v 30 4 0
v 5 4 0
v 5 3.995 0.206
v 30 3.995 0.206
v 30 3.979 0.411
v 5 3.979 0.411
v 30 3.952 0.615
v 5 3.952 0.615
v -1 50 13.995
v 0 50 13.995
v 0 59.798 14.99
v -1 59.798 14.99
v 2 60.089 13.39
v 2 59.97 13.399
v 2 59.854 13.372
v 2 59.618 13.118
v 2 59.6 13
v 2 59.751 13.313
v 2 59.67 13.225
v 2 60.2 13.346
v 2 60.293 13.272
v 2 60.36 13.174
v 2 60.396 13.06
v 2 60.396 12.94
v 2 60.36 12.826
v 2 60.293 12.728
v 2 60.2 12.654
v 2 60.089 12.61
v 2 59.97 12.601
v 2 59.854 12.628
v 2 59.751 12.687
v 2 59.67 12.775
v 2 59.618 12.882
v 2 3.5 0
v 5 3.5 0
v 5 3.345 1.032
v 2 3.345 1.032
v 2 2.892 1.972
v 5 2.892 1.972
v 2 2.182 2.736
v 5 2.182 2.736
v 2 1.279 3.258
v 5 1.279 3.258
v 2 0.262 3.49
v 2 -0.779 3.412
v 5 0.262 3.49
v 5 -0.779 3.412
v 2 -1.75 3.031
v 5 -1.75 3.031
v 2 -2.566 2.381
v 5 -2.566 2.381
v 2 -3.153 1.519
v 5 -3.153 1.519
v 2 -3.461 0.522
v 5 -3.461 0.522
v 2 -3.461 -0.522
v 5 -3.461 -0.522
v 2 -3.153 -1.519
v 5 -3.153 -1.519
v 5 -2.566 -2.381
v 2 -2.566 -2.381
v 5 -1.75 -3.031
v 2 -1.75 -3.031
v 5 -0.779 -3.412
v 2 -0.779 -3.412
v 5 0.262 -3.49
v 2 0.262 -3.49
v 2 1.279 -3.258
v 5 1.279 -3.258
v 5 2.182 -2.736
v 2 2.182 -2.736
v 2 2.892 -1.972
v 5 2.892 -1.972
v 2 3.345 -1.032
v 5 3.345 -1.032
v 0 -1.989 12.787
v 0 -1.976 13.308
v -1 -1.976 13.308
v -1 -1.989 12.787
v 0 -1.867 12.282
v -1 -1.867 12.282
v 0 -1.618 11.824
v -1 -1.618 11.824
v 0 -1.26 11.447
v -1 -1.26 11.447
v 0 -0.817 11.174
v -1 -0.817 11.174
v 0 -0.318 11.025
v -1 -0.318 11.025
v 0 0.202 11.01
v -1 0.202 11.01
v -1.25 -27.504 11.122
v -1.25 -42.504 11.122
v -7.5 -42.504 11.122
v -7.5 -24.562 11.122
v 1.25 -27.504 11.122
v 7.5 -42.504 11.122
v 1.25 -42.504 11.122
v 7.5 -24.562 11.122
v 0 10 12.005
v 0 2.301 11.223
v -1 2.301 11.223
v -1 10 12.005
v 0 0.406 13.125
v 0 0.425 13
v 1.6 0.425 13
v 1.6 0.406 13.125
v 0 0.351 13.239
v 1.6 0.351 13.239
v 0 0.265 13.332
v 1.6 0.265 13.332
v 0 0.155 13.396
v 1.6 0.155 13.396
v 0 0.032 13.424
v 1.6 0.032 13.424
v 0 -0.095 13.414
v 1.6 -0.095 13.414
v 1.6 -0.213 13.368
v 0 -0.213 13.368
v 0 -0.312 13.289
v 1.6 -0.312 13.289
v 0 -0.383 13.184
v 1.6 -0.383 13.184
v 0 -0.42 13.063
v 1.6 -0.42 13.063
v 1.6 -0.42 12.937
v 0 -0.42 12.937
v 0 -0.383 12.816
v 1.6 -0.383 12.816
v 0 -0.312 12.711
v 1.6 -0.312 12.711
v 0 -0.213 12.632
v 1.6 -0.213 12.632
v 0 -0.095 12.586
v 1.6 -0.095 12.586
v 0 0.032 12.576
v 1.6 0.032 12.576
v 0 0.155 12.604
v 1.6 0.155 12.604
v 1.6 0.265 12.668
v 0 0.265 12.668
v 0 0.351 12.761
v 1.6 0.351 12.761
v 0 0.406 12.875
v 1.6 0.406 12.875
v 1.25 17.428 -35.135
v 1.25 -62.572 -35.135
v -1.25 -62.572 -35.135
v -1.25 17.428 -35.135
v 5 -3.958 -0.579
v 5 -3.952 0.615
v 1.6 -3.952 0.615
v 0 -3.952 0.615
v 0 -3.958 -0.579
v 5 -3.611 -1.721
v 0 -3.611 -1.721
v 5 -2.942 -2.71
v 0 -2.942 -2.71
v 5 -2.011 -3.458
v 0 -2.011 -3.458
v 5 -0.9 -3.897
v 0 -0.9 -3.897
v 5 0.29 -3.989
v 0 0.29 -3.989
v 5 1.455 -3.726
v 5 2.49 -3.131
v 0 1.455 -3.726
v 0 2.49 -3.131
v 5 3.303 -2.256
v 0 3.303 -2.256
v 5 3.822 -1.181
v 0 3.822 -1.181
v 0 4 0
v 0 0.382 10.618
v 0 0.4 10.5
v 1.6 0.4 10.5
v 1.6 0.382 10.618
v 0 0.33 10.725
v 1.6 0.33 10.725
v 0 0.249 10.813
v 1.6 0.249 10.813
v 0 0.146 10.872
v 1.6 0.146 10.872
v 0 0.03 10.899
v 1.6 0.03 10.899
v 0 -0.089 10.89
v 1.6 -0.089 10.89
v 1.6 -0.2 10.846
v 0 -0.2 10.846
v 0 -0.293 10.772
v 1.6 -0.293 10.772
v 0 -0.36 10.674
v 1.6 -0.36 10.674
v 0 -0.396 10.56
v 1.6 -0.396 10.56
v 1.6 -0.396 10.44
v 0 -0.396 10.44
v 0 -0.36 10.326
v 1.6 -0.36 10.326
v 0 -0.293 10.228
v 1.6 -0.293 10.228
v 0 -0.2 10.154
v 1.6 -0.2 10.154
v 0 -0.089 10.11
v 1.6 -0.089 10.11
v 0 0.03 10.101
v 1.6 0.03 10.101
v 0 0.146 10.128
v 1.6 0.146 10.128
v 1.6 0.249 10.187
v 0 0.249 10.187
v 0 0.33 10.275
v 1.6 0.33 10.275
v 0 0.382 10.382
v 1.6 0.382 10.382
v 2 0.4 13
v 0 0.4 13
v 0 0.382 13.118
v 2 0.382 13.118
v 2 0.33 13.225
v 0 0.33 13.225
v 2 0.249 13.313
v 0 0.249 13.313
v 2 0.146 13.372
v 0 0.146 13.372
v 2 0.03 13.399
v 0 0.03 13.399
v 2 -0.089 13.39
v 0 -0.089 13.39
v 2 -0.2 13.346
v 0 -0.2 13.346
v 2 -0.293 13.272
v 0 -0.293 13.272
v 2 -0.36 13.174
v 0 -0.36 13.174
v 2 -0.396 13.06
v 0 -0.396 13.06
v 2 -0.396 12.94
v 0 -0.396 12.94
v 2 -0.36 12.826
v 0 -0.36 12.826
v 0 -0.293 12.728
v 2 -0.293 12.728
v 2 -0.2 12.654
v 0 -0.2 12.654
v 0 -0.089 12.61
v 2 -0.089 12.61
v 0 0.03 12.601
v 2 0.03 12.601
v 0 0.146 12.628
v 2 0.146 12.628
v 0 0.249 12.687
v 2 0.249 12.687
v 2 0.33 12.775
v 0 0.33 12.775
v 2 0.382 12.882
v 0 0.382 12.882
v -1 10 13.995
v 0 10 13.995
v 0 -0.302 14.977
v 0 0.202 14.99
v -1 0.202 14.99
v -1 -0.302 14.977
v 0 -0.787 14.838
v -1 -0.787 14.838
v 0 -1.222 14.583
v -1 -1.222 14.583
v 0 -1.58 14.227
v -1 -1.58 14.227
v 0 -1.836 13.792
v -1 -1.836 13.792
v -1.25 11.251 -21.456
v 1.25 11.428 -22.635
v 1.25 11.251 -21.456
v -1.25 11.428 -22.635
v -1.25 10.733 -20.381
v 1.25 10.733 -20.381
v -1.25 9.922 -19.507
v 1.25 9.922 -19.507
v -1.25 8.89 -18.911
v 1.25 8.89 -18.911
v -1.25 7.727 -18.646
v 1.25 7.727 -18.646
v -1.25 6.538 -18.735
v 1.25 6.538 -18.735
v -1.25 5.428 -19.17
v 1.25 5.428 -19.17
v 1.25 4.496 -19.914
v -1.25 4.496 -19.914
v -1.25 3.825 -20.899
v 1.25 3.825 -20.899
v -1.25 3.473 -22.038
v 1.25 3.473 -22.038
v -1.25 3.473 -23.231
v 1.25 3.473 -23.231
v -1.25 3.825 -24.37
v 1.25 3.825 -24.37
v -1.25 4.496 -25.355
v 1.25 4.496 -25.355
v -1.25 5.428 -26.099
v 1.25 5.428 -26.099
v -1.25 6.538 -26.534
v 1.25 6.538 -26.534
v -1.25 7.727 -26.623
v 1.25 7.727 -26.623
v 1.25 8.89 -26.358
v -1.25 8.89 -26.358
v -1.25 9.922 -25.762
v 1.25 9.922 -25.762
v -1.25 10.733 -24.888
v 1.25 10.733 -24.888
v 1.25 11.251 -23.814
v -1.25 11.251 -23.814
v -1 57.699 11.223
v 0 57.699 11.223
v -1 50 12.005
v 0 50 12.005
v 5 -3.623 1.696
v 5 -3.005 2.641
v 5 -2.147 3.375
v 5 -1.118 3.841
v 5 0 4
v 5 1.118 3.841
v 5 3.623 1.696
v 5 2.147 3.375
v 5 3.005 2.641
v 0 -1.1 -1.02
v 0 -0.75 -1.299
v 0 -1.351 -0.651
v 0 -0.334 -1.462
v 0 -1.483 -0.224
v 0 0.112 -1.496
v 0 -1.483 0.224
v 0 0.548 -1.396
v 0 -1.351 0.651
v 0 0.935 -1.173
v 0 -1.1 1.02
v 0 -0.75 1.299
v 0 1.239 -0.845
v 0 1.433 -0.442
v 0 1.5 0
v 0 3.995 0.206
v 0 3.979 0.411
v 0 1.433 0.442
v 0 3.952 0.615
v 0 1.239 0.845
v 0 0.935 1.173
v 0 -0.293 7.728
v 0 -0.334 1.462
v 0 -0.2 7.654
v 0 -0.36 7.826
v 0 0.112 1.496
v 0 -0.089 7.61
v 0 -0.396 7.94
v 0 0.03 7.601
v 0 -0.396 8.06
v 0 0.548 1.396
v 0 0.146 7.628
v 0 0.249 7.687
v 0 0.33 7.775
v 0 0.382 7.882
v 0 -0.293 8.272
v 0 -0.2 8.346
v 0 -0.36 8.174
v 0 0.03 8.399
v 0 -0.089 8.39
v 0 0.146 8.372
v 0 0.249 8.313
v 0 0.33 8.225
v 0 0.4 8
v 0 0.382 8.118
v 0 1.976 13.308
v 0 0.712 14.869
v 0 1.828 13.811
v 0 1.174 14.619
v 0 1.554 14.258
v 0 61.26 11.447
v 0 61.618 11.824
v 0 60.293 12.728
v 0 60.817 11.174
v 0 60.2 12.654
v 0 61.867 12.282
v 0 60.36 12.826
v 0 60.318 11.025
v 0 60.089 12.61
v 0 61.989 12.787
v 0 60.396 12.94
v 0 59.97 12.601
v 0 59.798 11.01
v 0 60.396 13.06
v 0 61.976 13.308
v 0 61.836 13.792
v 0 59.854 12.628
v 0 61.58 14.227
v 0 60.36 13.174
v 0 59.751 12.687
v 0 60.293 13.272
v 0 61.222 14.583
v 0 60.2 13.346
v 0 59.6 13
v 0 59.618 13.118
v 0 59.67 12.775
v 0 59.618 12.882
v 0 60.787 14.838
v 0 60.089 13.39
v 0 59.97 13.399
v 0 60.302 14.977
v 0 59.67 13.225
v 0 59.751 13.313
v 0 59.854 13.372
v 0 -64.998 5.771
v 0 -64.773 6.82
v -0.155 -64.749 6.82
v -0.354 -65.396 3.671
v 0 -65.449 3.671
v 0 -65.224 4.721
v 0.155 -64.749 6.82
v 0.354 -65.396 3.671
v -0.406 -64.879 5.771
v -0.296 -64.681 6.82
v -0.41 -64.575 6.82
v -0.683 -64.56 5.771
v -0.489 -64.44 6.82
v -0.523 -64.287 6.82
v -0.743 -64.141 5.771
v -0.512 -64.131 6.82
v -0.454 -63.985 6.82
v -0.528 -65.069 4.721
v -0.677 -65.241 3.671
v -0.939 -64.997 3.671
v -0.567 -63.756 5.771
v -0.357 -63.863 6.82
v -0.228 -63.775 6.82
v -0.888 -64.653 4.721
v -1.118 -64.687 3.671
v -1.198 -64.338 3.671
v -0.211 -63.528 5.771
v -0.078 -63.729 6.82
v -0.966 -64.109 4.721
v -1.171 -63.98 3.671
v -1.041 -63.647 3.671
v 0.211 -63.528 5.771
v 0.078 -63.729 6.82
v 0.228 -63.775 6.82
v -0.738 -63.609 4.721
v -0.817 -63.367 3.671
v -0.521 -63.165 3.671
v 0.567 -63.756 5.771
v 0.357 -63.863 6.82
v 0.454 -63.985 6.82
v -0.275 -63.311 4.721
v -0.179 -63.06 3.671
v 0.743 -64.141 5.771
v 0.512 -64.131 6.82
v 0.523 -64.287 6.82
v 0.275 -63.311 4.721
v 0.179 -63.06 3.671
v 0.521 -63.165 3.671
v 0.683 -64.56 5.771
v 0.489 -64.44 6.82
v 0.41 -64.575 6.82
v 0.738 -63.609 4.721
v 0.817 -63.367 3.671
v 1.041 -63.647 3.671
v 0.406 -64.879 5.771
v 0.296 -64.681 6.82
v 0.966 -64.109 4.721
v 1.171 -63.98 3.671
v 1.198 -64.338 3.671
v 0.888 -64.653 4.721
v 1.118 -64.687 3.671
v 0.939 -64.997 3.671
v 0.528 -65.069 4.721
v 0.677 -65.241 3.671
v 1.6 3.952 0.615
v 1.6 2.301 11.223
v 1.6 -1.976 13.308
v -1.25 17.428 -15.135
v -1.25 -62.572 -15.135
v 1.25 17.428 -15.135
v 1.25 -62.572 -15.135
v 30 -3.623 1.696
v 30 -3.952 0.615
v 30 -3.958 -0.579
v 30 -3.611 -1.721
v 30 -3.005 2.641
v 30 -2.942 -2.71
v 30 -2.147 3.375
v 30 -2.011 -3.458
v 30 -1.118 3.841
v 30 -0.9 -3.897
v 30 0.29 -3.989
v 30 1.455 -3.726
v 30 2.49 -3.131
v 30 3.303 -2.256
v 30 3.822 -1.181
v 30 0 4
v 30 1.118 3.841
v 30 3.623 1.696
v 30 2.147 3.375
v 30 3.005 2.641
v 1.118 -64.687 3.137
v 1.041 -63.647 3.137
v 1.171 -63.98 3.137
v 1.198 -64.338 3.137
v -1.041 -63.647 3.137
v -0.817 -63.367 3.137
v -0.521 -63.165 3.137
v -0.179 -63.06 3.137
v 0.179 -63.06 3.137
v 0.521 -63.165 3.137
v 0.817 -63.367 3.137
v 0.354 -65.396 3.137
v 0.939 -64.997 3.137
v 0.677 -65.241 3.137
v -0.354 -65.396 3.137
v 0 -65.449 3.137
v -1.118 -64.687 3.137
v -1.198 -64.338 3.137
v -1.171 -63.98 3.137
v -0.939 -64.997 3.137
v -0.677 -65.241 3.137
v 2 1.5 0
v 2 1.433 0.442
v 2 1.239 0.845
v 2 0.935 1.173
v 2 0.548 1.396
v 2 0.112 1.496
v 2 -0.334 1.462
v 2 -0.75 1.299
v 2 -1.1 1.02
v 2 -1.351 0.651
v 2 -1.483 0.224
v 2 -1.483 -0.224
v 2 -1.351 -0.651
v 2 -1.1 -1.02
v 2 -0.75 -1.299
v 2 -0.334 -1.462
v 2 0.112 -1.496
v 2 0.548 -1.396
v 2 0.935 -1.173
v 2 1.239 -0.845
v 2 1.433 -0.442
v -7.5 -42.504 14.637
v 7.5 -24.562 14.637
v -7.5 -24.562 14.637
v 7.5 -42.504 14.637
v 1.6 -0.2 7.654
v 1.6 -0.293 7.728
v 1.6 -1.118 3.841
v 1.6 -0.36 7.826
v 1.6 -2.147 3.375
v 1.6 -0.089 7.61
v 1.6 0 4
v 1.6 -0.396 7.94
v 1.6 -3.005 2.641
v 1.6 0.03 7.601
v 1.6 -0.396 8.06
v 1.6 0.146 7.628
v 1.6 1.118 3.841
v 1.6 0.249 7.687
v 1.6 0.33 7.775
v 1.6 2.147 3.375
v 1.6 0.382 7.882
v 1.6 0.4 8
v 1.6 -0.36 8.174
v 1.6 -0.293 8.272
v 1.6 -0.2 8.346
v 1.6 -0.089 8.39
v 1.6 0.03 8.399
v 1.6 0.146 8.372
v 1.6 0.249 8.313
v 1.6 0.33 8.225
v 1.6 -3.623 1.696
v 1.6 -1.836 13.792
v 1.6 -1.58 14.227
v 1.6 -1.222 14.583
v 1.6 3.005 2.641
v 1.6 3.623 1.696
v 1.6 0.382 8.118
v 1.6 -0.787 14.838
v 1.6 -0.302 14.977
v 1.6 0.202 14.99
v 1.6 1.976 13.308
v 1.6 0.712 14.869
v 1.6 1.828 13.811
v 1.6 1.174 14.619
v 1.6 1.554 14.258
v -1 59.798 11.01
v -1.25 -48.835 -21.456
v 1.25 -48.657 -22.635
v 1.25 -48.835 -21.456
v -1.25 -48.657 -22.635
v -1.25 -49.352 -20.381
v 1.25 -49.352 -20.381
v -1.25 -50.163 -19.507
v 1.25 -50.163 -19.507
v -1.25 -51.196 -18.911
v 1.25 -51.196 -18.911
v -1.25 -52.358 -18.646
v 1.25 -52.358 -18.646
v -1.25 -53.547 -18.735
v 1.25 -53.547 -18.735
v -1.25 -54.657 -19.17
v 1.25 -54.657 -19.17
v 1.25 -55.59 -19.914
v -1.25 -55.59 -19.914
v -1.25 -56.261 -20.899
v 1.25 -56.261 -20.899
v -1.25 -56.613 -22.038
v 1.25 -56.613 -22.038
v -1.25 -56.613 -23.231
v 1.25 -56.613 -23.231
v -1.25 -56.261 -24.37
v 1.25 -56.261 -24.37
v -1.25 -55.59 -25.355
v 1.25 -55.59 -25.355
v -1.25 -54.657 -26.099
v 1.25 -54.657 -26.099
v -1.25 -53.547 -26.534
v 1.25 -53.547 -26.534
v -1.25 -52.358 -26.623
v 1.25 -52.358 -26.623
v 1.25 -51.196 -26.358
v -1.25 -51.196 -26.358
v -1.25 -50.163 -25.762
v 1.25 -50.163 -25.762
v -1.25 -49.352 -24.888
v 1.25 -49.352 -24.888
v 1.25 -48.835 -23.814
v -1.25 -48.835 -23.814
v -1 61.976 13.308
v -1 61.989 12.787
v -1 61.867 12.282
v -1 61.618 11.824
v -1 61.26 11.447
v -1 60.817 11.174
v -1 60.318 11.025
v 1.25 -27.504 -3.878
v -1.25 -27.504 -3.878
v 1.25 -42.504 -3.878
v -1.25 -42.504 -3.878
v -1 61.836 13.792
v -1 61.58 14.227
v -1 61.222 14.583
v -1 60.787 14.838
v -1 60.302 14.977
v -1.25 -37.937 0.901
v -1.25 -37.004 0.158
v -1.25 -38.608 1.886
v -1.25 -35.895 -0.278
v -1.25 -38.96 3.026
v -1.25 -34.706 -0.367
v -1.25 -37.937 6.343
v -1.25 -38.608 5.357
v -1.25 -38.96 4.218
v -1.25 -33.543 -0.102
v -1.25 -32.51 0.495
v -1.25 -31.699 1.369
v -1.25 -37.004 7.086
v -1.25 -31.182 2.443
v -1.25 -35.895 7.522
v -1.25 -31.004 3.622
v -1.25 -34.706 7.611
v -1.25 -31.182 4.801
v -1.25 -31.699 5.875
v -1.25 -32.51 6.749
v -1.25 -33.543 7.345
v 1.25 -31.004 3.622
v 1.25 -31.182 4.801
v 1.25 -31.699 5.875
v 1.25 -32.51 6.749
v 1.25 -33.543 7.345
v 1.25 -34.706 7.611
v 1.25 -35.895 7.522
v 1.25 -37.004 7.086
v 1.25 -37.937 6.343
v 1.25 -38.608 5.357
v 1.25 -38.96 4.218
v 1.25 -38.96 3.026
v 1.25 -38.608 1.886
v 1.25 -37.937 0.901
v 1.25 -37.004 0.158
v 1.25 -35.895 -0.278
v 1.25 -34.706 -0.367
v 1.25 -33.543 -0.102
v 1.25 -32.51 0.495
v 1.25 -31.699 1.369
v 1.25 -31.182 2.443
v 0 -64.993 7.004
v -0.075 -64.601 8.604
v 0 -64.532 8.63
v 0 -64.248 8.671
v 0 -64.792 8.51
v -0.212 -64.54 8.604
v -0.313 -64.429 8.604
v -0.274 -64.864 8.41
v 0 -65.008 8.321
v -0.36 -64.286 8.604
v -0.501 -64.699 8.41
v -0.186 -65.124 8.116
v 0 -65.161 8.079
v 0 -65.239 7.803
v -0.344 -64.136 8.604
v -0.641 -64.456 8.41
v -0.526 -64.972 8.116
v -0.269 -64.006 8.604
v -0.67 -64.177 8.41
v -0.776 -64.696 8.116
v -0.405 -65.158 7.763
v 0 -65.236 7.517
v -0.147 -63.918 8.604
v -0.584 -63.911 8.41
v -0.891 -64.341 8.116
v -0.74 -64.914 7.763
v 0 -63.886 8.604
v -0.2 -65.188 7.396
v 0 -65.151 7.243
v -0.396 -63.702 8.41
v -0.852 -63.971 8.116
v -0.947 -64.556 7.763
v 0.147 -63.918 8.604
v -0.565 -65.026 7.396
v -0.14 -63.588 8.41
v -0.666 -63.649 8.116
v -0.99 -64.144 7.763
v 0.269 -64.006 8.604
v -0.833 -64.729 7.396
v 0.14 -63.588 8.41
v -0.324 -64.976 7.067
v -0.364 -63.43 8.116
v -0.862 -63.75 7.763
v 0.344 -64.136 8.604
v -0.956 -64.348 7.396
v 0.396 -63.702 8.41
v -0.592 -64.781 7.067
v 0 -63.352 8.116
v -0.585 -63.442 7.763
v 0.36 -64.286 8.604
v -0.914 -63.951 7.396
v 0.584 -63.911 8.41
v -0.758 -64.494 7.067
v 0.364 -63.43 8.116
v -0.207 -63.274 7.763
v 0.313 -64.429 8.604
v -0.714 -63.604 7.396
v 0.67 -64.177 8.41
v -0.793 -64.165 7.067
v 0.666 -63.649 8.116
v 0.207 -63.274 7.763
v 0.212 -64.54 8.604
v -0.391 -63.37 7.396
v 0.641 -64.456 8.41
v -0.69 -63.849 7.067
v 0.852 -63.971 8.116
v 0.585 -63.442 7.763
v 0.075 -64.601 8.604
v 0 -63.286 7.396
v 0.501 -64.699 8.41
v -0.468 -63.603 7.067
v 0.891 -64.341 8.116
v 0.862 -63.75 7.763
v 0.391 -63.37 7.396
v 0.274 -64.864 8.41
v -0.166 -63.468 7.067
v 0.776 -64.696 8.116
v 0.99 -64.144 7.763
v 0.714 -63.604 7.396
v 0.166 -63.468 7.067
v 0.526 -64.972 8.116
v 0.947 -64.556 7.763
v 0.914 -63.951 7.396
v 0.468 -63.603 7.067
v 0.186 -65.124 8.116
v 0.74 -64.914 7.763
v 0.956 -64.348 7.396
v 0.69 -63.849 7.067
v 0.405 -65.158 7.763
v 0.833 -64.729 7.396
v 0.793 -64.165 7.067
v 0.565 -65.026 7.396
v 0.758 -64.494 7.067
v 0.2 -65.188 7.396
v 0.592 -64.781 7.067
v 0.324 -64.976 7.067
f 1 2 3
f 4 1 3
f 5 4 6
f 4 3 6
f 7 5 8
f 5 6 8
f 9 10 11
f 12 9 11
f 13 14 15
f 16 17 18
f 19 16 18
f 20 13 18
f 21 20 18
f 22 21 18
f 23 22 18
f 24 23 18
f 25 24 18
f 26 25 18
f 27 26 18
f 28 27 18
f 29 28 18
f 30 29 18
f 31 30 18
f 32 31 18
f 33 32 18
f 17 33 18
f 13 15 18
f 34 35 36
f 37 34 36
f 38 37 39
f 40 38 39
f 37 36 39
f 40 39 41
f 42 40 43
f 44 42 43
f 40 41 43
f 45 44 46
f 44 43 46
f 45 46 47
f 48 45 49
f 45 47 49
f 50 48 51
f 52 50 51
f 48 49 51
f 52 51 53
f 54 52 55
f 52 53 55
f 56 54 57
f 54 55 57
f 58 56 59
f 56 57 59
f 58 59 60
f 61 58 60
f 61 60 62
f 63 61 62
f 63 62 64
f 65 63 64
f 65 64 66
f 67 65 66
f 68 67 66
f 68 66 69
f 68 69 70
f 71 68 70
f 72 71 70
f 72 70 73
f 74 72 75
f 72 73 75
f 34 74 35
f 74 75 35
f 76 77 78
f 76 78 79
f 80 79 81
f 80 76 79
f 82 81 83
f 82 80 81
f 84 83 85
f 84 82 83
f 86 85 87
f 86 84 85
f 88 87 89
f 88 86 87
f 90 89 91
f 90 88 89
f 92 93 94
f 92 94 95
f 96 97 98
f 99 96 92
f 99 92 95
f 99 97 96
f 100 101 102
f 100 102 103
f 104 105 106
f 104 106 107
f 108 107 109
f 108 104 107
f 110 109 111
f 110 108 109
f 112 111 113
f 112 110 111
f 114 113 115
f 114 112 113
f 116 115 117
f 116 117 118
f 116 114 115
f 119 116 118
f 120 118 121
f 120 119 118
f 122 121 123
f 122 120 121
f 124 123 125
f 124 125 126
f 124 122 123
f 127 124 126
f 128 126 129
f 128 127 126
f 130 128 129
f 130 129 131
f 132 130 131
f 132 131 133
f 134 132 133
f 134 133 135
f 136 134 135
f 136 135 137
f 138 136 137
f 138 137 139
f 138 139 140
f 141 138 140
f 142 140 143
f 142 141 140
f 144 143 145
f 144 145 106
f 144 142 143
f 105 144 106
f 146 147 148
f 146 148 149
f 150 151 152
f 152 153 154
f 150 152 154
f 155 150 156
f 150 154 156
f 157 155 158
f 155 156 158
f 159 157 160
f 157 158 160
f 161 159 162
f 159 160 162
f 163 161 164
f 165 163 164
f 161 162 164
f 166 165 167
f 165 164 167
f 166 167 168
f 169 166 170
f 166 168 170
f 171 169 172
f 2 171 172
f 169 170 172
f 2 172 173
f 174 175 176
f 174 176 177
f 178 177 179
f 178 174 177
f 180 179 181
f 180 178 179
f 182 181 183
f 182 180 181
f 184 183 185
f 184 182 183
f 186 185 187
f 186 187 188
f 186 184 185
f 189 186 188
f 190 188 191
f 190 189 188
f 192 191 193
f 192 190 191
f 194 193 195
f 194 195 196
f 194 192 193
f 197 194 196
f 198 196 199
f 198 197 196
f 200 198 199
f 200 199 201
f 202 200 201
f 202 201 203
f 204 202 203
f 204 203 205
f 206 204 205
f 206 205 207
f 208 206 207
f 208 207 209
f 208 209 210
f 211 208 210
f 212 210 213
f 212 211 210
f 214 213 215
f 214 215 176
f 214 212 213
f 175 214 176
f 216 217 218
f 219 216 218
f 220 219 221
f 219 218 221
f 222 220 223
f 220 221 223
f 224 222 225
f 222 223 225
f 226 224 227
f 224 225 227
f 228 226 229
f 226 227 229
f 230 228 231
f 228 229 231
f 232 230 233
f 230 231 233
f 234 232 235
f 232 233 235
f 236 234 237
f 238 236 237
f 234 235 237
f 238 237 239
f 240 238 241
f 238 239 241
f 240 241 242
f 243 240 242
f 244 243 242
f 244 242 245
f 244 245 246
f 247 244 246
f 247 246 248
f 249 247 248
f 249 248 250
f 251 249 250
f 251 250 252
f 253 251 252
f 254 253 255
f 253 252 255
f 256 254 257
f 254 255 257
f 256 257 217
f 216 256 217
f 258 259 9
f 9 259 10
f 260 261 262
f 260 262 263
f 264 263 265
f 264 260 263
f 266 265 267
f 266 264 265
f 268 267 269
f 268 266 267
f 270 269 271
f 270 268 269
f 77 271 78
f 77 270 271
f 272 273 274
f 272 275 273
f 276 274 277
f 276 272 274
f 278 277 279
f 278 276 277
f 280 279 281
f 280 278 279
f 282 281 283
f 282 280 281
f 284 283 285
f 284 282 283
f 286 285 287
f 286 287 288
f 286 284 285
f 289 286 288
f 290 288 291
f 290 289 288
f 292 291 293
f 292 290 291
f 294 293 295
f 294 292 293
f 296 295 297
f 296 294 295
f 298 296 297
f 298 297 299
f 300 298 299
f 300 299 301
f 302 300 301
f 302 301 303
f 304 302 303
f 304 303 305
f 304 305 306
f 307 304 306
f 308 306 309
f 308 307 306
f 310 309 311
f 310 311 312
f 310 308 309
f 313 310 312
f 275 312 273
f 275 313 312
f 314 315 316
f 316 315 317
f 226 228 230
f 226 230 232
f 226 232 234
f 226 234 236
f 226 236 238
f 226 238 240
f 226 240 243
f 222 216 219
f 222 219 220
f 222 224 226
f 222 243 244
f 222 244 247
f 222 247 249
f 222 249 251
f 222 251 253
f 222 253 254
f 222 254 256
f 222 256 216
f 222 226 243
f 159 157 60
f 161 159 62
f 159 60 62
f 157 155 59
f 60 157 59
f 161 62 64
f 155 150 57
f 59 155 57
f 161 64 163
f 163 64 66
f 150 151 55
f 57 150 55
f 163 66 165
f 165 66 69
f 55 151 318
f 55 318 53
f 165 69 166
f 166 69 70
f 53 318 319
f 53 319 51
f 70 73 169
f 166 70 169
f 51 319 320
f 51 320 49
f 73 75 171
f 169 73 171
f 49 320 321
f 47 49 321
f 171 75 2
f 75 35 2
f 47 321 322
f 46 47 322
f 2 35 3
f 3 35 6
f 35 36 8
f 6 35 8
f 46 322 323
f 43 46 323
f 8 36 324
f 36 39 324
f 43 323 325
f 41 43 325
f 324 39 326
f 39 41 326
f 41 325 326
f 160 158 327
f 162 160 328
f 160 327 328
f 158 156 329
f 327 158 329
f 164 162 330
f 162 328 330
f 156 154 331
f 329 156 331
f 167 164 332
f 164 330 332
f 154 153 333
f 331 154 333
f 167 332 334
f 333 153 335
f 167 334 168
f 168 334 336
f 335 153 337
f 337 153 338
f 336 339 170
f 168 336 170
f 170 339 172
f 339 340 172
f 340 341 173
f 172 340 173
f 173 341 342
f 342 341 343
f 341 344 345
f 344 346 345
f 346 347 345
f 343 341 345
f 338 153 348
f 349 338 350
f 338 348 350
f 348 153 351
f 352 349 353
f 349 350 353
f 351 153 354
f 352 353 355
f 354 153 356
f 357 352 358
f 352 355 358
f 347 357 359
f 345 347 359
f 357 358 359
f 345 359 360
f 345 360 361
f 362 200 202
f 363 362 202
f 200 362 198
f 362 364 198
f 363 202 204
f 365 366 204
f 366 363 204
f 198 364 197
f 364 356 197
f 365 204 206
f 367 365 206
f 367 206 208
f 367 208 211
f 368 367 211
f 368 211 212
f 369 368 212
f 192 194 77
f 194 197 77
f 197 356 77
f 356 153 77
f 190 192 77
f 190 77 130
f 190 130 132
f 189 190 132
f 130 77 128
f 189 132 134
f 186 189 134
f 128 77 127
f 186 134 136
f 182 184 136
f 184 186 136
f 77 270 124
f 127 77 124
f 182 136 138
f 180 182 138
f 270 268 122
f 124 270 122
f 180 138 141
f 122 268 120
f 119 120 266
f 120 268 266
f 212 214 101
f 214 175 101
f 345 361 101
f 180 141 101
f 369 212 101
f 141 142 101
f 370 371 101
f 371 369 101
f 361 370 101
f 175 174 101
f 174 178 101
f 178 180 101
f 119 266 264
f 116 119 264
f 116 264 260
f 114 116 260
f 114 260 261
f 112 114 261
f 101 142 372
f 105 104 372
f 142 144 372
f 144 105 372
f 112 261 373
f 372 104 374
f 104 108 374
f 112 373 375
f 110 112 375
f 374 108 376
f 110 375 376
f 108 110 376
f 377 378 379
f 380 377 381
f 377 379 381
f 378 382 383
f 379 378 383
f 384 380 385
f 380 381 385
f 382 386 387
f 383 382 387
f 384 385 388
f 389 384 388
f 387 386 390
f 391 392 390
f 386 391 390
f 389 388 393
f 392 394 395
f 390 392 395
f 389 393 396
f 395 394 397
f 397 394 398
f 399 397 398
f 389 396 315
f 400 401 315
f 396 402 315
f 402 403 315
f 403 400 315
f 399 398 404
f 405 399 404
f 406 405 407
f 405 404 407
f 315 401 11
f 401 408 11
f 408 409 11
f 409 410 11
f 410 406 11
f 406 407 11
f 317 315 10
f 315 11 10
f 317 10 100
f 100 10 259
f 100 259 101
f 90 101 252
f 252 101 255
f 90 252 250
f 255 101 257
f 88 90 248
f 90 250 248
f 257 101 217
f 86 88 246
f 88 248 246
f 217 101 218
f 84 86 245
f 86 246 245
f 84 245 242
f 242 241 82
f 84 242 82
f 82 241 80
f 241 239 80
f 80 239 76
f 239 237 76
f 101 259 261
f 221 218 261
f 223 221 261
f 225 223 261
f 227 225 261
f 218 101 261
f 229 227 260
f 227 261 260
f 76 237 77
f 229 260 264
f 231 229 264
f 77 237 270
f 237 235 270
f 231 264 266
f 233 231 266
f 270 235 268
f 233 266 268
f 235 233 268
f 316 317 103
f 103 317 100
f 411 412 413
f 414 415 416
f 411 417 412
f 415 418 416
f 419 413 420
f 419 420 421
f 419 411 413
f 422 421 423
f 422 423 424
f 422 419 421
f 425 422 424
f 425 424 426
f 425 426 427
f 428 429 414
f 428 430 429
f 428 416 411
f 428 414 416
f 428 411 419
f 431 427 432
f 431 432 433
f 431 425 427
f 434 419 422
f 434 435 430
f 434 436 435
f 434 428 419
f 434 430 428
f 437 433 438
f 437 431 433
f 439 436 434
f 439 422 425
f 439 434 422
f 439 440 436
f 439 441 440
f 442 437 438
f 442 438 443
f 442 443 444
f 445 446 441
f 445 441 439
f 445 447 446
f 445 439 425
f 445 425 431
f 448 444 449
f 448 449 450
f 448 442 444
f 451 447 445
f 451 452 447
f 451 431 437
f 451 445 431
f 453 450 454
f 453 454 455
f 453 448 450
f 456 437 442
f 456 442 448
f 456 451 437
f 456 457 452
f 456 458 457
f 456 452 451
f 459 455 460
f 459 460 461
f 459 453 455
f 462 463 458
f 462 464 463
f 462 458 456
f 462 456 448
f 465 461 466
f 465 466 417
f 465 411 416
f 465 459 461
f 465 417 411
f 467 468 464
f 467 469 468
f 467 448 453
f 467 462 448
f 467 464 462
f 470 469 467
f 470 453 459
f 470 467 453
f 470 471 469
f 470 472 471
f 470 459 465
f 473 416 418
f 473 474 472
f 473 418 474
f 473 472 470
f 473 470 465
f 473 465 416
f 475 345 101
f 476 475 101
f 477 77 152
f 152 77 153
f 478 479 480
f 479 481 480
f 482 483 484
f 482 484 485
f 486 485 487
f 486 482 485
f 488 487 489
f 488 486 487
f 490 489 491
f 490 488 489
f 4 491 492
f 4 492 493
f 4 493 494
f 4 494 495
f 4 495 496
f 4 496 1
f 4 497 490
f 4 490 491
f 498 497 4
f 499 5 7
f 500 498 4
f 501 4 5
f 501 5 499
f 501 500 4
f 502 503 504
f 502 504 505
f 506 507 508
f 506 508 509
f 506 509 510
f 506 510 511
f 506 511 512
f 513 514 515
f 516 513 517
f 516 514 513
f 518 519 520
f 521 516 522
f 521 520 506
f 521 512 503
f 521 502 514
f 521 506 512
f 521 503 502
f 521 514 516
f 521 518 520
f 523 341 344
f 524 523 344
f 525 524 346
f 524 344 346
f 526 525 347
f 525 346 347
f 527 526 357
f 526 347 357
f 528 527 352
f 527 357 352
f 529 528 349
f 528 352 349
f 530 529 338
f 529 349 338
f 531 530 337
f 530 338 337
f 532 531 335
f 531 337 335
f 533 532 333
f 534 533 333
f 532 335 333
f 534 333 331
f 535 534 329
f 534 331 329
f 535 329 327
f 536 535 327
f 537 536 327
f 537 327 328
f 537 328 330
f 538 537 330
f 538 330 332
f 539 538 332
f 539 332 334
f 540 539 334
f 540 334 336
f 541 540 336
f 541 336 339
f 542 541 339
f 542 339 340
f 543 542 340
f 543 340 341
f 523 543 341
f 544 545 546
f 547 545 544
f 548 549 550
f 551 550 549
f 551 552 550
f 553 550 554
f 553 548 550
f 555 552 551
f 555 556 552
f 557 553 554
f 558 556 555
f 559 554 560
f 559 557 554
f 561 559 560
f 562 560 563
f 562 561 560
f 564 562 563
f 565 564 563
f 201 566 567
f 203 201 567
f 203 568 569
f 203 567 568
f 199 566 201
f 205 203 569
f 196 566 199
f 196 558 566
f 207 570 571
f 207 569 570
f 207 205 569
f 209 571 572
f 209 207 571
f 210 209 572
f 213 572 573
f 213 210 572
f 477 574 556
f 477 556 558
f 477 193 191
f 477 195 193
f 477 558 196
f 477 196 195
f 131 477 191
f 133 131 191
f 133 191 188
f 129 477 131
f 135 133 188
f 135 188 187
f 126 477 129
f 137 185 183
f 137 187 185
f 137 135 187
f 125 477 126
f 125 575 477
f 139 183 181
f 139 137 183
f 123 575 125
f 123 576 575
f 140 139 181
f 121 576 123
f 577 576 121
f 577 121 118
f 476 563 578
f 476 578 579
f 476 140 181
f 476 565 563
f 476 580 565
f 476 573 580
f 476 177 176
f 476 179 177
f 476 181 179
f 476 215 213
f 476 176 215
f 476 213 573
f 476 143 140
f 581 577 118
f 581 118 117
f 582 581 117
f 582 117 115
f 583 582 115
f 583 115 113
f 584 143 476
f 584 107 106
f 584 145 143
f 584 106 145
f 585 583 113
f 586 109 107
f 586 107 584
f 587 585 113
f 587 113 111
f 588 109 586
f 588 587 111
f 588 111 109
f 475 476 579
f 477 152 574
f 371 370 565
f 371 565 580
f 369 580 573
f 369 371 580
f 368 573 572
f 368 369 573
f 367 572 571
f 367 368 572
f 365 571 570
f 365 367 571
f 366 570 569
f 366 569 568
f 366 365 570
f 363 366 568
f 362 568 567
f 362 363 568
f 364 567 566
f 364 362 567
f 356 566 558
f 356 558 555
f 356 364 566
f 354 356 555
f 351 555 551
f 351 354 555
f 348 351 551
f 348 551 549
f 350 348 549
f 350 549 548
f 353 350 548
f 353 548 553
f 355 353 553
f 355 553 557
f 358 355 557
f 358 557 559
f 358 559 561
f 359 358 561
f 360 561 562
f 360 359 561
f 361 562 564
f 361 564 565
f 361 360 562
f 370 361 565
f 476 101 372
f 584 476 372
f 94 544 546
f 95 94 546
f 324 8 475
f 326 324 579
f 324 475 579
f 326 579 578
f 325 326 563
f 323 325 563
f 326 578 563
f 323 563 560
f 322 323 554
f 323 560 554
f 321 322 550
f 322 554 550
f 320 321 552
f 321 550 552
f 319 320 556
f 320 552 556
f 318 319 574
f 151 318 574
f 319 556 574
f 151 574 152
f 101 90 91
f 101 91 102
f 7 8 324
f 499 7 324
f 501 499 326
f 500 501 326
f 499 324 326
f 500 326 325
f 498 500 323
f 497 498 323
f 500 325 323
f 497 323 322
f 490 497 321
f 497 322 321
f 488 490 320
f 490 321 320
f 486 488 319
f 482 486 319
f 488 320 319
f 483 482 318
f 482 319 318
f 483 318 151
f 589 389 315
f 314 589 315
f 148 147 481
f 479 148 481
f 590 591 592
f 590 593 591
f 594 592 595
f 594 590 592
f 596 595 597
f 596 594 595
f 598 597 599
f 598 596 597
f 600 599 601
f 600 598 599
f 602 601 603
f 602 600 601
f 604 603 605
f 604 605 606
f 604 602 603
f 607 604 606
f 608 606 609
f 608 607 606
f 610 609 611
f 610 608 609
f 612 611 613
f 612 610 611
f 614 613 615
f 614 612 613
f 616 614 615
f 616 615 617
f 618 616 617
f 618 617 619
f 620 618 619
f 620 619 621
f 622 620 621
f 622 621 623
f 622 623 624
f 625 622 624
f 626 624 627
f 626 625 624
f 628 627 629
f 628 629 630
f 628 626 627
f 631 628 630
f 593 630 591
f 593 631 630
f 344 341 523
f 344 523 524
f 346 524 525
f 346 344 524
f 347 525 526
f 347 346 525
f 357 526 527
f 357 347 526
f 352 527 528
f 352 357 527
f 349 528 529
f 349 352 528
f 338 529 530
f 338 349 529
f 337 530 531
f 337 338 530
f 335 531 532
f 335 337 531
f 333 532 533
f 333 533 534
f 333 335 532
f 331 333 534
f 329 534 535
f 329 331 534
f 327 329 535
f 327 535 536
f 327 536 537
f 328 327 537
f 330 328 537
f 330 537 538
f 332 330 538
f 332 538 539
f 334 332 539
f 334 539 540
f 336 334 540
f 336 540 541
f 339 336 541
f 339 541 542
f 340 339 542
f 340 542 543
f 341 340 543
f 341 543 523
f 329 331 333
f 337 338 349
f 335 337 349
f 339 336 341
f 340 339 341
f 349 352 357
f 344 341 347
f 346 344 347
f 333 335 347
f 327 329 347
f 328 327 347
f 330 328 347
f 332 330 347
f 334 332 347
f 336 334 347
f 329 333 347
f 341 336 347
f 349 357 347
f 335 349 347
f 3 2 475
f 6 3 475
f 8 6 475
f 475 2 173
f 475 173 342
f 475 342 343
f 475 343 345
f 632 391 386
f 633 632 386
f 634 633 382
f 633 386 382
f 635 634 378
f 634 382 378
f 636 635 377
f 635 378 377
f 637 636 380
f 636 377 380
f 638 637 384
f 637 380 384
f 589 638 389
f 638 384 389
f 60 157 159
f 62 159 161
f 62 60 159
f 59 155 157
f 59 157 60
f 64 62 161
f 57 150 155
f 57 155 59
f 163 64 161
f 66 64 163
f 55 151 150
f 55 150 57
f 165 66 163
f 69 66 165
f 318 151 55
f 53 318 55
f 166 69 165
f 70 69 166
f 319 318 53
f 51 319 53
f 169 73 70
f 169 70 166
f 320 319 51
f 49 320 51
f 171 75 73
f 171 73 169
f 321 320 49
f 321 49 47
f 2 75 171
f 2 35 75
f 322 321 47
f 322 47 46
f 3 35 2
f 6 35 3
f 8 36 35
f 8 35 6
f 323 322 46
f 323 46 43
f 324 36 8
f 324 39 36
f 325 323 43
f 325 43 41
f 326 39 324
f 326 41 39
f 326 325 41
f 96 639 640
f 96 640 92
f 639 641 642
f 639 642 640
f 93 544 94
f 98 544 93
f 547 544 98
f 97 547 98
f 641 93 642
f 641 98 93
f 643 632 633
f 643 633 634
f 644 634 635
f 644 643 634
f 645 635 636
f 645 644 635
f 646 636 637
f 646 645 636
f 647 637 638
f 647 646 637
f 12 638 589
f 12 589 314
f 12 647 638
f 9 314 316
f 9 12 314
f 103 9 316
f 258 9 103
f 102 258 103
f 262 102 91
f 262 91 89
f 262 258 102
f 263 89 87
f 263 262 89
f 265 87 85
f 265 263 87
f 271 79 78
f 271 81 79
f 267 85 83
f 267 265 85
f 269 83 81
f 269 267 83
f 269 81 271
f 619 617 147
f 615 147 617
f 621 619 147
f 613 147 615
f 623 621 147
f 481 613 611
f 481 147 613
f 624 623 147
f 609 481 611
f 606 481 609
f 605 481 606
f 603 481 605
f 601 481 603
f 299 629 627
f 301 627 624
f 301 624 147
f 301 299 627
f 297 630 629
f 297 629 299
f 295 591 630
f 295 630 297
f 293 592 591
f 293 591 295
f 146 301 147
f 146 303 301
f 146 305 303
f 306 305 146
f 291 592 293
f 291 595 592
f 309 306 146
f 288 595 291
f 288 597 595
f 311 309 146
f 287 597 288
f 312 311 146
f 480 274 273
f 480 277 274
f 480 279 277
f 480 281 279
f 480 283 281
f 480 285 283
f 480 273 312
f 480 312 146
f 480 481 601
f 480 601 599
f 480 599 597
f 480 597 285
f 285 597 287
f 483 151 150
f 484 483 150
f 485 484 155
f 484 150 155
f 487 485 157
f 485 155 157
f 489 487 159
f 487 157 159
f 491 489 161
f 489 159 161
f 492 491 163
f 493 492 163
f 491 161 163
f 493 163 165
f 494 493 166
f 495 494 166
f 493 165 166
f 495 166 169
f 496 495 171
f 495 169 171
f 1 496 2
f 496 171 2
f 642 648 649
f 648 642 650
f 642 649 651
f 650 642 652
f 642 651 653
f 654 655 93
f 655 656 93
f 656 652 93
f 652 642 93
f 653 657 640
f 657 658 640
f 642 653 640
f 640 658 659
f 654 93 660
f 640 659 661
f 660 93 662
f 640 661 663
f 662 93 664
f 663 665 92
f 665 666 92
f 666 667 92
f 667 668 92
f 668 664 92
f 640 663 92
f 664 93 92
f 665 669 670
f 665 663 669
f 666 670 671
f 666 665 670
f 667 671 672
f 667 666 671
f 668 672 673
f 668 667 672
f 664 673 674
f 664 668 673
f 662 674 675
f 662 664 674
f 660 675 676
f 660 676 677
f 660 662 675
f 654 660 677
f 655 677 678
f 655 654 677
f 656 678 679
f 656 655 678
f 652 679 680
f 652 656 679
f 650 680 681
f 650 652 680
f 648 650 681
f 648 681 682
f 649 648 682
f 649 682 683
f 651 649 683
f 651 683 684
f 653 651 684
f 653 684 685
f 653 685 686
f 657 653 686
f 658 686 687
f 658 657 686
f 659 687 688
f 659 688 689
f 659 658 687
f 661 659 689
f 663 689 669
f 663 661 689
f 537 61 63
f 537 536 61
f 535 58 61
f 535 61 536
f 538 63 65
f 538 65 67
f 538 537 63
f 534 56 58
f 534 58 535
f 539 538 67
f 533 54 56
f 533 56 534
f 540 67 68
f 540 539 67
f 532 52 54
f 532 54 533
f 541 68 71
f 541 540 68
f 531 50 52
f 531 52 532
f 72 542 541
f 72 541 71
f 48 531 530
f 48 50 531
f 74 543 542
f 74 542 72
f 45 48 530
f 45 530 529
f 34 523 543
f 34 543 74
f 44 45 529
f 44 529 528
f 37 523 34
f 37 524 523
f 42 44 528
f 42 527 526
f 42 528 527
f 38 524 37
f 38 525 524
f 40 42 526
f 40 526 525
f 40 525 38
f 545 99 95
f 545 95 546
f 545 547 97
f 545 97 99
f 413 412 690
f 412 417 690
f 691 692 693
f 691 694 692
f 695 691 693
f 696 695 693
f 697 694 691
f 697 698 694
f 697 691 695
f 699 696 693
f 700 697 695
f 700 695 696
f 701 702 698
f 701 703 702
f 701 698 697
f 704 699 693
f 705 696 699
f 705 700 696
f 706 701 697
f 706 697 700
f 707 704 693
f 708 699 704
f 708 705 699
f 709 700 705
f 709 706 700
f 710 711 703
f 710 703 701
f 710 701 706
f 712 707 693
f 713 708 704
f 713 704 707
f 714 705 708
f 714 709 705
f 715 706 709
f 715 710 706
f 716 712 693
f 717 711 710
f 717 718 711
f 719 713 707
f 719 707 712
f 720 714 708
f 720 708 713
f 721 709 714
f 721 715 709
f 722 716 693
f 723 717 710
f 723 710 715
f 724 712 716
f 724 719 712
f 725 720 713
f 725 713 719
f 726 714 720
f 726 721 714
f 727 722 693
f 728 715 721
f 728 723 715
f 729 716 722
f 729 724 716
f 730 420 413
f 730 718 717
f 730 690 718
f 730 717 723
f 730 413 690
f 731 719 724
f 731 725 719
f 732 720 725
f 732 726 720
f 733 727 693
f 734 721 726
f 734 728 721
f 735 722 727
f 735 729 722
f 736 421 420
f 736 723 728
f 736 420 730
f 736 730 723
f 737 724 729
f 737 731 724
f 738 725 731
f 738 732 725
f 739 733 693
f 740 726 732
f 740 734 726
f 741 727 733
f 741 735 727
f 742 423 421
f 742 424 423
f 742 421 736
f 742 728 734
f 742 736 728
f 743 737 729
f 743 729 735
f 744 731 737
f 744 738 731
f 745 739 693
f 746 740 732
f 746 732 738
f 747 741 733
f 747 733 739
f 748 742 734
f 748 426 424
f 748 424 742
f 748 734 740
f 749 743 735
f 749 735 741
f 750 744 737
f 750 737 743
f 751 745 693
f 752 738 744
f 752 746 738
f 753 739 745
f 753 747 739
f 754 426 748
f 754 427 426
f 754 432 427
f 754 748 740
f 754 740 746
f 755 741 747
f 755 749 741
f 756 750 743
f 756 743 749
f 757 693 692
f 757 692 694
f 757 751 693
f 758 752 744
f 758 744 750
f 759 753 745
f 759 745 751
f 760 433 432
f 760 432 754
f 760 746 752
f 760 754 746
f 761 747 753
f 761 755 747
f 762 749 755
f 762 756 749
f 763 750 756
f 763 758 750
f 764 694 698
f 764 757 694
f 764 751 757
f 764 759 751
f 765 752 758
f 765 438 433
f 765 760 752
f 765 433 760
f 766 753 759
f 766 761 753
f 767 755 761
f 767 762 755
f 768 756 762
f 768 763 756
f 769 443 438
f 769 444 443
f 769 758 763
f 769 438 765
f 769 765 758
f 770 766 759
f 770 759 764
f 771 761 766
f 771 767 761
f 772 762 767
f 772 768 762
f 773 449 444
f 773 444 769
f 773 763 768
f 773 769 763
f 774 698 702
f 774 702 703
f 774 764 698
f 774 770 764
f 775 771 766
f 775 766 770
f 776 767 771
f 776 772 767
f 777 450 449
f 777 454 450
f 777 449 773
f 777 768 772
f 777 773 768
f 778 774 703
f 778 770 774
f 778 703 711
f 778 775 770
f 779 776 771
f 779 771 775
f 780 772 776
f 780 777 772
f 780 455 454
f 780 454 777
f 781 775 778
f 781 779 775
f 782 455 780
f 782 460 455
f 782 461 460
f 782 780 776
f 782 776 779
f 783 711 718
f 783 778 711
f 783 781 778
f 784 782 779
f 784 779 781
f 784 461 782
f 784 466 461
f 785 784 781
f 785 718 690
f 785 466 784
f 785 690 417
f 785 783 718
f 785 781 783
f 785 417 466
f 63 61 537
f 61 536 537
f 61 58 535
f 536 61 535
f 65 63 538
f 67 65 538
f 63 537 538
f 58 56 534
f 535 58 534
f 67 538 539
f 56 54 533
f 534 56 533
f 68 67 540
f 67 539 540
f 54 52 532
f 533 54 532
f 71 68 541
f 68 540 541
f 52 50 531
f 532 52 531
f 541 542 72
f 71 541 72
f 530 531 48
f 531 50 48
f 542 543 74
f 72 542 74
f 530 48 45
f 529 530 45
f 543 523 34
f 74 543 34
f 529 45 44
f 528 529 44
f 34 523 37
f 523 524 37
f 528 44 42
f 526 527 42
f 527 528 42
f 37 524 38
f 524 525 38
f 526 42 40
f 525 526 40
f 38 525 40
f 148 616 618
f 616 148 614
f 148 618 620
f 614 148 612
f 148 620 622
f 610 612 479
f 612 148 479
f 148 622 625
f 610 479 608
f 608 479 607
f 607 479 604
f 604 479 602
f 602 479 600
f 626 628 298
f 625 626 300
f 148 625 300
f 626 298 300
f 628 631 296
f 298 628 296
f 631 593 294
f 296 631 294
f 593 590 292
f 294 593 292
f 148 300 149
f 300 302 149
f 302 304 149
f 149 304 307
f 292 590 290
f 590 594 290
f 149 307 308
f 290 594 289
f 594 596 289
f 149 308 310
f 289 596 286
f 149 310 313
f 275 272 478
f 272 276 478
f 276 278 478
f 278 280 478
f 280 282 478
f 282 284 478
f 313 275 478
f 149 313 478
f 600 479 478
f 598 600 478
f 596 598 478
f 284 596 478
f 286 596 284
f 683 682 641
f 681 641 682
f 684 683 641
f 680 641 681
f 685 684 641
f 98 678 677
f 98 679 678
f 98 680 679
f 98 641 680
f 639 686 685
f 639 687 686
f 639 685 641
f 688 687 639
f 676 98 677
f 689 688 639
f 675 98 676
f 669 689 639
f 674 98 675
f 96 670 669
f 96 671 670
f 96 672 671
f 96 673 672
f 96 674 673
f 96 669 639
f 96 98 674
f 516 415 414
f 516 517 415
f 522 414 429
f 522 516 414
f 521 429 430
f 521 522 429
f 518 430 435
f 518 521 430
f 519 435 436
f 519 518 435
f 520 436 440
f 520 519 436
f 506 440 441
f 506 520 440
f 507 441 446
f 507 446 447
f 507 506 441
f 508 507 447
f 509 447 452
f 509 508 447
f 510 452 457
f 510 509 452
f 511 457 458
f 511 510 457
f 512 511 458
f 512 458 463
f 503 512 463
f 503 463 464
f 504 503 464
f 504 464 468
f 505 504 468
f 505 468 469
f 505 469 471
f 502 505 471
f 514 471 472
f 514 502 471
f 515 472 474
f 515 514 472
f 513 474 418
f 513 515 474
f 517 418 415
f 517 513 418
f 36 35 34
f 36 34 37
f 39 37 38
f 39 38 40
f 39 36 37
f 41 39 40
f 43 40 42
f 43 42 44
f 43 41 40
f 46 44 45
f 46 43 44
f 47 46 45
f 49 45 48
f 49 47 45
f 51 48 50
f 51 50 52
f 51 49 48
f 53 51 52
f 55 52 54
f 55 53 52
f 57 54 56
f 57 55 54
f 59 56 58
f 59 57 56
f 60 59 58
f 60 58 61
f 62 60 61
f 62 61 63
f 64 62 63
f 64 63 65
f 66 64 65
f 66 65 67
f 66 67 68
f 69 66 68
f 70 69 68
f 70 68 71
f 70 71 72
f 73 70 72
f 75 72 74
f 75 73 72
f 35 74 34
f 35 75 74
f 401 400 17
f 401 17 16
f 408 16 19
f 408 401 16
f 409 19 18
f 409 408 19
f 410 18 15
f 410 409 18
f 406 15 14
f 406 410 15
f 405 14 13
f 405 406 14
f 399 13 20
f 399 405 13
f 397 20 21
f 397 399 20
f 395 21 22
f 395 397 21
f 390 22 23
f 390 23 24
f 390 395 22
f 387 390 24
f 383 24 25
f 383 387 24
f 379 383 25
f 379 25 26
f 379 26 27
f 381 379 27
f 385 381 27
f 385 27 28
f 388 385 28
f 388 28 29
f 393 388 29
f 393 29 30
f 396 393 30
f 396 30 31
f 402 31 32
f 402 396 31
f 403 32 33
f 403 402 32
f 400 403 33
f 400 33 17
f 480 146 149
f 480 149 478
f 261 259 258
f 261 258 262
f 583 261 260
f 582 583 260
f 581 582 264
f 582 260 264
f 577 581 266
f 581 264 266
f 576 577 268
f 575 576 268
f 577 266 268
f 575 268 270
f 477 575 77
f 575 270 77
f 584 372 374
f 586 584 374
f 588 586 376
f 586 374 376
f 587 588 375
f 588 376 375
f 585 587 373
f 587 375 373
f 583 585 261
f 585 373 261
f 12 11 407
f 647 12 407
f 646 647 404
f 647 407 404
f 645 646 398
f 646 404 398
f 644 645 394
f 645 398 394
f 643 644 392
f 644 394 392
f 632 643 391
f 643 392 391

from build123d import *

# Parameters (mm, degrees)
F0_R      = 0.4
F0_R_2    = 0.425
F1_DEPTH  = 1.6
F0_R_3    = 1.5
F2_DEPTH  = 5
F3_R      = 3.5
F3_R_2    = 1.5
F4_DEPTH  = 3
F5_DEPTH  = 1
F6_DEPTH  = 2
F8_DEPTH  = 30
F0_W      = 15
F0_H      = 15
F0_R_4    = 4
F10_DEPTH = 1.25
F11_DEPTH = 7.5
F0_W_2    = 80
F0_H_2    = 20
F12_DEPTH = 1.25


with BuildPart() as f1:
    # F0 (on Right) → F1 (new body)
    with BuildSketch(Plane.YZ):
        with BuildLine():
            ThreePointArc((-3.952379255, 0.6153846154), (0, 4), (3.952379255, 0.6153846154))
            Line((3.952379255, 0.6153846154), (2.3007241633, 11.2233315117))
            Line((2.3007241633, 11.2233315117), (0.2020410205, 11.0102313134))
            ThreePointArc((0.2020410205, 11.0102313134), (-1.451372652, 11.6239486111), (-1.9761896275, 13.3076923077))
            Line((-1.9761896275, 13.3076923077), (-3.952379255, 0.6153846154))
        make_face()
        with Locations((0, 8)):
            Circle(F0_R, mode=Mode.SUBTRACT)
        with Locations((0, 10.5)):
            Circle(F0_R, mode=Mode.SUBTRACT)
        with BuildLine():
            ThreePointArc((0.2020410289, 14.9897686857), (-1.2223935732, 14.5829573437), (-1.9761896275, 13.3076923077))
            ThreePointArc((-1.9761896275, 13.3076923077), (-1.451372652, 11.6239486111), (0.2020410205, 11.0102313134))
            ThreePointArc((0.2020410205, 11.0102313134), (1.4839275658, 11.6591200727), (2, 13))
            ThreePointArc((2, 13), (1.9940385221, 13.1543061001), (1.9761896275, 13.3076923077))
            ThreePointArc((1.9761896275, 13.3076923077), (1.376051392, 14.4513726491), (0.2020410289, 14.9897686857))
        make_face()
        with Locations((0, 13)):
            Circle(F0_R_2, mode=Mode.SUBTRACT)
        with BuildLine():
            Line((0.2020410205, 11.0102313134), (2.3007241633, 11.2233315117))
            Line((2.3007241633, 11.2233315117), (1.9761896275, 13.3076923077))
            ThreePointArc((1.9761896275, 13.3076923077), (1.9940385221, 13.1543061001), (2, 13))
            ThreePointArc((2, 13), (1.4839275658, 11.6591200727), (0.2020410205, 11.0102313134))
        make_face()
    extrude(amount=F1_DEPTH)

    # F0 (on Right) → F2 (join)
    with BuildSketch(Plane.YZ):
        with BuildLine():
            ThreePointArc((-3.952379255, 0.6153846154), (-0.3086122001, -3.9880770441), (4, 0))
            ThreePointArc((4, 0), (3.9880770441, 0.3086122001), (3.952379255, 0.6153846154))
            ThreePointArc((3.952379255, 0.6153846154), (0, 4), (-3.952379255, 0.6153846154))
        make_face()
        Circle(F0_R_3, mode=Mode.SUBTRACT)
    extrude(amount=F2_DEPTH)

    # F3 (on face) → F4 (cut)
    with BuildSketch(Plane.YZ.offset(5)):
        Circle(F3_R)
        Circle(F3_R_2, mode=Mode.SUBTRACT)
    extrude(amount=-F4_DEPTH, mode=Mode.SUBTRACT)


with BuildPart() as f5:
    # F0 (on Right) → F5 (new body)
    with BuildSketch(Plane.YZ):
        with BuildLine():
            ThreePointArc((10.8989794856, 13), (10.6409432699, 12.3295600379), (10, 12.0051156571))
            Line((10, 12.0051156571), (30, 12.0051156571))
            Line((30, 12.0051156571), (30, 13.9948843429))
            Line((30, 13.9948843429), (10, 13.9948843429))
            ThreePointArc((10, 13.9948843429), (10.6409432699, 13.6704399621), (10.8989794856, 13))
        make_face()
        with BuildLine():
            Line((1.9761896275, 13.3076923077), (2.3007241633, 11.2233315117))
            Line((2.3007241633, 11.2233315117), (10, 12.0051156571))
            ThreePointArc((10, 12.0051156571), (8.8989794856, 13), (10, 13.9948843429))
            Line((10, 13.9948843429), (0.2020410289, 14.9897686857))
            ThreePointArc((0.2020410289, 14.9897686857), (1.376051392, 14.4513726491), (1.9761896275, 13.3076923077))
        make_face()
        with BuildLine():
            ThreePointArc((0.2020410289, 14.9897686857), (-1.2223935732, 14.5829573437), (-1.9761896275, 13.3076923077))
            ThreePointArc((-1.9761896275, 13.3076923077), (-1.451372652, 11.6239486111), (0.2020410205, 11.0102313134))
            ThreePointArc((0.2020410205, 11.0102313134), (1.4839275658, 11.6591200727), (2, 13))
            ThreePointArc((2, 13), (1.9940385221, 13.1543061001), (1.9761896275, 13.3076923077))
            ThreePointArc((1.9761896275, 13.3076923077), (1.376051392, 14.4513726491), (0.2020410289, 14.9897686857))
        make_face()
        with Locations((0, 13)):
            Circle(F0_R_2, mode=Mode.SUBTRACT)
        with BuildLine():
            ThreePointArc((10, 13.9948843429), (8.8989794856, 13), (10, 12.0051156571))
            ThreePointArc((10, 12.0051156571), (10.6409432699, 12.3295600379), (10.8989794856, 13))
            ThreePointArc((10.8989794856, 13), (10.6409432699, 13.6704399621), (10, 13.9948843429))
        make_face()
        with BuildLine():
            Line((0.2020410205, 11.0102313134), (2.3007241633, 11.2233315117))
            Line((2.3007241633, 11.2233315117), (1.9761896275, 13.3076923077))
            ThreePointArc((1.9761896275, 13.3076923077), (1.9940385221, 13.1543061001), (2, 13))
            ThreePointArc((2, 13), (1.4839275658, 11.6591200727), (0.2020410205, 11.0102313134))
        make_face()
        with Locations((0, 13)):
            Circle(F0_R_2)
        with Locations((0, 13)):
            Circle(F0_R, mode=Mode.SUBTRACT)
        with Locations((0, 13)):
            Circle(F0_R)
    extrude(amount=-F5_DEPTH)

    # F0 (on Right) → F6 (join)
    with BuildSketch(Plane.YZ):
        with Locations((0, 13)):
            Circle(F0_R)
    extrude(amount=F6_DEPTH)

    # F7: F5 across face


with BuildPart() as f5_1:
    add(f5.part)
    add(f5.part.mirror(Plane(origin=(-0.5, 30, 13), x_dir=(-1, 0, 0), z_dir=(0, 1, 0))))


with BuildPart() as f8:
    # F0 (on Right) → F8 (new body)
    with BuildSketch(Plane.YZ):
        with BuildLine():
            ThreePointArc((-3.952379255, 0.6153846154), (-0.3086122001, -3.9880770441), (4, 0))
            ThreePointArc((4, 0), (3.9880770441, 0.3086122001), (3.952379255, 0.6153846154))
            ThreePointArc((3.952379255, 0.6153846154), (0, 4), (-3.952379255, 0.6153846154))
        make_face()
        Circle(F0_R_3, mode=Mode.SUBTRACT)
        Circle(F0_R_3)
    extrude(amount=F8_DEPTH)

    # F9: cut F1
    add(f1.part, mode=Mode.SUBTRACT)


with BuildPart() as f10:
    # F0 (on Right) → F10 (new body, symmetric)
    with BuildSketch(Plane.YZ):
        with Locations((-35.0044366717, 3.6218684912)):
            Rectangle(F0_W, F0_H)
        with Locations((-35.0044366717, 3.6218684912)):
            Circle(F0_R_4, mode=Mode.SUBTRACT)
    extrude(amount=F10_DEPTH, both=True)

    # F0 (on Right) → F11 (join, symmetric)
    with BuildSketch(Plane.YZ):
        Polygon((-42.5044366717, 14.636519365), (-42.5044366717, 11.1218684912), (-27.5044366717, 11.1218684912), (-24.5620086789, 11.1218684912), (-24.5620086789, 14.636519365), align=None)
    extrude(amount=F11_DEPTH, both=True)


with BuildPart() as f12:
    # F0 (on Right) → F12 (new body, symmetric)
    with BuildSketch(Plane.YZ):
        with Locations((-22.5715031475, -25.1345673949)):
            Rectangle(F0_W_2, F0_H_2)
        with Locations((-52.6573488116, -22.6345673949)):
            Circle(F0_R_4, mode=Mode.SUBTRACT)
        with Locations((7.4284968525, -22.6345673949)):
            Circle(F0_R_4, mode=Mode.SUBTRACT)
    extrude(amount=F12_DEPTH, both=True)


with BuildPart() as f13:
    # F0 (on Right) → F13 (revolve)
    with BuildSketch(Plane.YZ):
        with BuildLine():
            Line((-64.2478317022, 6.6713448353), (-64.2478317022, 8.6713448353))
            ThreePointArc((-64.2478317022, 8.6713448353), (-65.2099202037, 7.9440822829), (-64.7726268267, 6.820116266))
            ThreePointArc((-64.7726268267, 6.820116266), (-64.5205691498, 6.7092563338), (-64.2478317022, 6.6713448353))
        make_face()
        with BuildLine():
            ThreePointArc((-64.2478317022, 6.6713448353), (-64.5205691498, 6.7092563338), (-64.7726268267, 6.820116266))
            Line((-64.7726268267, 6.820116266), (-65.4493719339, 3.6713448353))
            Line((-65.4493719339, 3.6713448353), (-65.4493719339, 3.1371545047))
            Line((-65.4493719339, 3.1371545047), (-64.2478317022, 3.1371545047))
            Line((-64.2478317022, 3.1371545047), (-64.2478317022, 6.6713448353))
        make_face()
    revolve(axis=Axis((0, -64.2478317022, 3.5368323289), (0, 0, -1)))


solid = Compound([f1.part, f5_1.part, f8.part, f10.part, f12.part, f13.part])
